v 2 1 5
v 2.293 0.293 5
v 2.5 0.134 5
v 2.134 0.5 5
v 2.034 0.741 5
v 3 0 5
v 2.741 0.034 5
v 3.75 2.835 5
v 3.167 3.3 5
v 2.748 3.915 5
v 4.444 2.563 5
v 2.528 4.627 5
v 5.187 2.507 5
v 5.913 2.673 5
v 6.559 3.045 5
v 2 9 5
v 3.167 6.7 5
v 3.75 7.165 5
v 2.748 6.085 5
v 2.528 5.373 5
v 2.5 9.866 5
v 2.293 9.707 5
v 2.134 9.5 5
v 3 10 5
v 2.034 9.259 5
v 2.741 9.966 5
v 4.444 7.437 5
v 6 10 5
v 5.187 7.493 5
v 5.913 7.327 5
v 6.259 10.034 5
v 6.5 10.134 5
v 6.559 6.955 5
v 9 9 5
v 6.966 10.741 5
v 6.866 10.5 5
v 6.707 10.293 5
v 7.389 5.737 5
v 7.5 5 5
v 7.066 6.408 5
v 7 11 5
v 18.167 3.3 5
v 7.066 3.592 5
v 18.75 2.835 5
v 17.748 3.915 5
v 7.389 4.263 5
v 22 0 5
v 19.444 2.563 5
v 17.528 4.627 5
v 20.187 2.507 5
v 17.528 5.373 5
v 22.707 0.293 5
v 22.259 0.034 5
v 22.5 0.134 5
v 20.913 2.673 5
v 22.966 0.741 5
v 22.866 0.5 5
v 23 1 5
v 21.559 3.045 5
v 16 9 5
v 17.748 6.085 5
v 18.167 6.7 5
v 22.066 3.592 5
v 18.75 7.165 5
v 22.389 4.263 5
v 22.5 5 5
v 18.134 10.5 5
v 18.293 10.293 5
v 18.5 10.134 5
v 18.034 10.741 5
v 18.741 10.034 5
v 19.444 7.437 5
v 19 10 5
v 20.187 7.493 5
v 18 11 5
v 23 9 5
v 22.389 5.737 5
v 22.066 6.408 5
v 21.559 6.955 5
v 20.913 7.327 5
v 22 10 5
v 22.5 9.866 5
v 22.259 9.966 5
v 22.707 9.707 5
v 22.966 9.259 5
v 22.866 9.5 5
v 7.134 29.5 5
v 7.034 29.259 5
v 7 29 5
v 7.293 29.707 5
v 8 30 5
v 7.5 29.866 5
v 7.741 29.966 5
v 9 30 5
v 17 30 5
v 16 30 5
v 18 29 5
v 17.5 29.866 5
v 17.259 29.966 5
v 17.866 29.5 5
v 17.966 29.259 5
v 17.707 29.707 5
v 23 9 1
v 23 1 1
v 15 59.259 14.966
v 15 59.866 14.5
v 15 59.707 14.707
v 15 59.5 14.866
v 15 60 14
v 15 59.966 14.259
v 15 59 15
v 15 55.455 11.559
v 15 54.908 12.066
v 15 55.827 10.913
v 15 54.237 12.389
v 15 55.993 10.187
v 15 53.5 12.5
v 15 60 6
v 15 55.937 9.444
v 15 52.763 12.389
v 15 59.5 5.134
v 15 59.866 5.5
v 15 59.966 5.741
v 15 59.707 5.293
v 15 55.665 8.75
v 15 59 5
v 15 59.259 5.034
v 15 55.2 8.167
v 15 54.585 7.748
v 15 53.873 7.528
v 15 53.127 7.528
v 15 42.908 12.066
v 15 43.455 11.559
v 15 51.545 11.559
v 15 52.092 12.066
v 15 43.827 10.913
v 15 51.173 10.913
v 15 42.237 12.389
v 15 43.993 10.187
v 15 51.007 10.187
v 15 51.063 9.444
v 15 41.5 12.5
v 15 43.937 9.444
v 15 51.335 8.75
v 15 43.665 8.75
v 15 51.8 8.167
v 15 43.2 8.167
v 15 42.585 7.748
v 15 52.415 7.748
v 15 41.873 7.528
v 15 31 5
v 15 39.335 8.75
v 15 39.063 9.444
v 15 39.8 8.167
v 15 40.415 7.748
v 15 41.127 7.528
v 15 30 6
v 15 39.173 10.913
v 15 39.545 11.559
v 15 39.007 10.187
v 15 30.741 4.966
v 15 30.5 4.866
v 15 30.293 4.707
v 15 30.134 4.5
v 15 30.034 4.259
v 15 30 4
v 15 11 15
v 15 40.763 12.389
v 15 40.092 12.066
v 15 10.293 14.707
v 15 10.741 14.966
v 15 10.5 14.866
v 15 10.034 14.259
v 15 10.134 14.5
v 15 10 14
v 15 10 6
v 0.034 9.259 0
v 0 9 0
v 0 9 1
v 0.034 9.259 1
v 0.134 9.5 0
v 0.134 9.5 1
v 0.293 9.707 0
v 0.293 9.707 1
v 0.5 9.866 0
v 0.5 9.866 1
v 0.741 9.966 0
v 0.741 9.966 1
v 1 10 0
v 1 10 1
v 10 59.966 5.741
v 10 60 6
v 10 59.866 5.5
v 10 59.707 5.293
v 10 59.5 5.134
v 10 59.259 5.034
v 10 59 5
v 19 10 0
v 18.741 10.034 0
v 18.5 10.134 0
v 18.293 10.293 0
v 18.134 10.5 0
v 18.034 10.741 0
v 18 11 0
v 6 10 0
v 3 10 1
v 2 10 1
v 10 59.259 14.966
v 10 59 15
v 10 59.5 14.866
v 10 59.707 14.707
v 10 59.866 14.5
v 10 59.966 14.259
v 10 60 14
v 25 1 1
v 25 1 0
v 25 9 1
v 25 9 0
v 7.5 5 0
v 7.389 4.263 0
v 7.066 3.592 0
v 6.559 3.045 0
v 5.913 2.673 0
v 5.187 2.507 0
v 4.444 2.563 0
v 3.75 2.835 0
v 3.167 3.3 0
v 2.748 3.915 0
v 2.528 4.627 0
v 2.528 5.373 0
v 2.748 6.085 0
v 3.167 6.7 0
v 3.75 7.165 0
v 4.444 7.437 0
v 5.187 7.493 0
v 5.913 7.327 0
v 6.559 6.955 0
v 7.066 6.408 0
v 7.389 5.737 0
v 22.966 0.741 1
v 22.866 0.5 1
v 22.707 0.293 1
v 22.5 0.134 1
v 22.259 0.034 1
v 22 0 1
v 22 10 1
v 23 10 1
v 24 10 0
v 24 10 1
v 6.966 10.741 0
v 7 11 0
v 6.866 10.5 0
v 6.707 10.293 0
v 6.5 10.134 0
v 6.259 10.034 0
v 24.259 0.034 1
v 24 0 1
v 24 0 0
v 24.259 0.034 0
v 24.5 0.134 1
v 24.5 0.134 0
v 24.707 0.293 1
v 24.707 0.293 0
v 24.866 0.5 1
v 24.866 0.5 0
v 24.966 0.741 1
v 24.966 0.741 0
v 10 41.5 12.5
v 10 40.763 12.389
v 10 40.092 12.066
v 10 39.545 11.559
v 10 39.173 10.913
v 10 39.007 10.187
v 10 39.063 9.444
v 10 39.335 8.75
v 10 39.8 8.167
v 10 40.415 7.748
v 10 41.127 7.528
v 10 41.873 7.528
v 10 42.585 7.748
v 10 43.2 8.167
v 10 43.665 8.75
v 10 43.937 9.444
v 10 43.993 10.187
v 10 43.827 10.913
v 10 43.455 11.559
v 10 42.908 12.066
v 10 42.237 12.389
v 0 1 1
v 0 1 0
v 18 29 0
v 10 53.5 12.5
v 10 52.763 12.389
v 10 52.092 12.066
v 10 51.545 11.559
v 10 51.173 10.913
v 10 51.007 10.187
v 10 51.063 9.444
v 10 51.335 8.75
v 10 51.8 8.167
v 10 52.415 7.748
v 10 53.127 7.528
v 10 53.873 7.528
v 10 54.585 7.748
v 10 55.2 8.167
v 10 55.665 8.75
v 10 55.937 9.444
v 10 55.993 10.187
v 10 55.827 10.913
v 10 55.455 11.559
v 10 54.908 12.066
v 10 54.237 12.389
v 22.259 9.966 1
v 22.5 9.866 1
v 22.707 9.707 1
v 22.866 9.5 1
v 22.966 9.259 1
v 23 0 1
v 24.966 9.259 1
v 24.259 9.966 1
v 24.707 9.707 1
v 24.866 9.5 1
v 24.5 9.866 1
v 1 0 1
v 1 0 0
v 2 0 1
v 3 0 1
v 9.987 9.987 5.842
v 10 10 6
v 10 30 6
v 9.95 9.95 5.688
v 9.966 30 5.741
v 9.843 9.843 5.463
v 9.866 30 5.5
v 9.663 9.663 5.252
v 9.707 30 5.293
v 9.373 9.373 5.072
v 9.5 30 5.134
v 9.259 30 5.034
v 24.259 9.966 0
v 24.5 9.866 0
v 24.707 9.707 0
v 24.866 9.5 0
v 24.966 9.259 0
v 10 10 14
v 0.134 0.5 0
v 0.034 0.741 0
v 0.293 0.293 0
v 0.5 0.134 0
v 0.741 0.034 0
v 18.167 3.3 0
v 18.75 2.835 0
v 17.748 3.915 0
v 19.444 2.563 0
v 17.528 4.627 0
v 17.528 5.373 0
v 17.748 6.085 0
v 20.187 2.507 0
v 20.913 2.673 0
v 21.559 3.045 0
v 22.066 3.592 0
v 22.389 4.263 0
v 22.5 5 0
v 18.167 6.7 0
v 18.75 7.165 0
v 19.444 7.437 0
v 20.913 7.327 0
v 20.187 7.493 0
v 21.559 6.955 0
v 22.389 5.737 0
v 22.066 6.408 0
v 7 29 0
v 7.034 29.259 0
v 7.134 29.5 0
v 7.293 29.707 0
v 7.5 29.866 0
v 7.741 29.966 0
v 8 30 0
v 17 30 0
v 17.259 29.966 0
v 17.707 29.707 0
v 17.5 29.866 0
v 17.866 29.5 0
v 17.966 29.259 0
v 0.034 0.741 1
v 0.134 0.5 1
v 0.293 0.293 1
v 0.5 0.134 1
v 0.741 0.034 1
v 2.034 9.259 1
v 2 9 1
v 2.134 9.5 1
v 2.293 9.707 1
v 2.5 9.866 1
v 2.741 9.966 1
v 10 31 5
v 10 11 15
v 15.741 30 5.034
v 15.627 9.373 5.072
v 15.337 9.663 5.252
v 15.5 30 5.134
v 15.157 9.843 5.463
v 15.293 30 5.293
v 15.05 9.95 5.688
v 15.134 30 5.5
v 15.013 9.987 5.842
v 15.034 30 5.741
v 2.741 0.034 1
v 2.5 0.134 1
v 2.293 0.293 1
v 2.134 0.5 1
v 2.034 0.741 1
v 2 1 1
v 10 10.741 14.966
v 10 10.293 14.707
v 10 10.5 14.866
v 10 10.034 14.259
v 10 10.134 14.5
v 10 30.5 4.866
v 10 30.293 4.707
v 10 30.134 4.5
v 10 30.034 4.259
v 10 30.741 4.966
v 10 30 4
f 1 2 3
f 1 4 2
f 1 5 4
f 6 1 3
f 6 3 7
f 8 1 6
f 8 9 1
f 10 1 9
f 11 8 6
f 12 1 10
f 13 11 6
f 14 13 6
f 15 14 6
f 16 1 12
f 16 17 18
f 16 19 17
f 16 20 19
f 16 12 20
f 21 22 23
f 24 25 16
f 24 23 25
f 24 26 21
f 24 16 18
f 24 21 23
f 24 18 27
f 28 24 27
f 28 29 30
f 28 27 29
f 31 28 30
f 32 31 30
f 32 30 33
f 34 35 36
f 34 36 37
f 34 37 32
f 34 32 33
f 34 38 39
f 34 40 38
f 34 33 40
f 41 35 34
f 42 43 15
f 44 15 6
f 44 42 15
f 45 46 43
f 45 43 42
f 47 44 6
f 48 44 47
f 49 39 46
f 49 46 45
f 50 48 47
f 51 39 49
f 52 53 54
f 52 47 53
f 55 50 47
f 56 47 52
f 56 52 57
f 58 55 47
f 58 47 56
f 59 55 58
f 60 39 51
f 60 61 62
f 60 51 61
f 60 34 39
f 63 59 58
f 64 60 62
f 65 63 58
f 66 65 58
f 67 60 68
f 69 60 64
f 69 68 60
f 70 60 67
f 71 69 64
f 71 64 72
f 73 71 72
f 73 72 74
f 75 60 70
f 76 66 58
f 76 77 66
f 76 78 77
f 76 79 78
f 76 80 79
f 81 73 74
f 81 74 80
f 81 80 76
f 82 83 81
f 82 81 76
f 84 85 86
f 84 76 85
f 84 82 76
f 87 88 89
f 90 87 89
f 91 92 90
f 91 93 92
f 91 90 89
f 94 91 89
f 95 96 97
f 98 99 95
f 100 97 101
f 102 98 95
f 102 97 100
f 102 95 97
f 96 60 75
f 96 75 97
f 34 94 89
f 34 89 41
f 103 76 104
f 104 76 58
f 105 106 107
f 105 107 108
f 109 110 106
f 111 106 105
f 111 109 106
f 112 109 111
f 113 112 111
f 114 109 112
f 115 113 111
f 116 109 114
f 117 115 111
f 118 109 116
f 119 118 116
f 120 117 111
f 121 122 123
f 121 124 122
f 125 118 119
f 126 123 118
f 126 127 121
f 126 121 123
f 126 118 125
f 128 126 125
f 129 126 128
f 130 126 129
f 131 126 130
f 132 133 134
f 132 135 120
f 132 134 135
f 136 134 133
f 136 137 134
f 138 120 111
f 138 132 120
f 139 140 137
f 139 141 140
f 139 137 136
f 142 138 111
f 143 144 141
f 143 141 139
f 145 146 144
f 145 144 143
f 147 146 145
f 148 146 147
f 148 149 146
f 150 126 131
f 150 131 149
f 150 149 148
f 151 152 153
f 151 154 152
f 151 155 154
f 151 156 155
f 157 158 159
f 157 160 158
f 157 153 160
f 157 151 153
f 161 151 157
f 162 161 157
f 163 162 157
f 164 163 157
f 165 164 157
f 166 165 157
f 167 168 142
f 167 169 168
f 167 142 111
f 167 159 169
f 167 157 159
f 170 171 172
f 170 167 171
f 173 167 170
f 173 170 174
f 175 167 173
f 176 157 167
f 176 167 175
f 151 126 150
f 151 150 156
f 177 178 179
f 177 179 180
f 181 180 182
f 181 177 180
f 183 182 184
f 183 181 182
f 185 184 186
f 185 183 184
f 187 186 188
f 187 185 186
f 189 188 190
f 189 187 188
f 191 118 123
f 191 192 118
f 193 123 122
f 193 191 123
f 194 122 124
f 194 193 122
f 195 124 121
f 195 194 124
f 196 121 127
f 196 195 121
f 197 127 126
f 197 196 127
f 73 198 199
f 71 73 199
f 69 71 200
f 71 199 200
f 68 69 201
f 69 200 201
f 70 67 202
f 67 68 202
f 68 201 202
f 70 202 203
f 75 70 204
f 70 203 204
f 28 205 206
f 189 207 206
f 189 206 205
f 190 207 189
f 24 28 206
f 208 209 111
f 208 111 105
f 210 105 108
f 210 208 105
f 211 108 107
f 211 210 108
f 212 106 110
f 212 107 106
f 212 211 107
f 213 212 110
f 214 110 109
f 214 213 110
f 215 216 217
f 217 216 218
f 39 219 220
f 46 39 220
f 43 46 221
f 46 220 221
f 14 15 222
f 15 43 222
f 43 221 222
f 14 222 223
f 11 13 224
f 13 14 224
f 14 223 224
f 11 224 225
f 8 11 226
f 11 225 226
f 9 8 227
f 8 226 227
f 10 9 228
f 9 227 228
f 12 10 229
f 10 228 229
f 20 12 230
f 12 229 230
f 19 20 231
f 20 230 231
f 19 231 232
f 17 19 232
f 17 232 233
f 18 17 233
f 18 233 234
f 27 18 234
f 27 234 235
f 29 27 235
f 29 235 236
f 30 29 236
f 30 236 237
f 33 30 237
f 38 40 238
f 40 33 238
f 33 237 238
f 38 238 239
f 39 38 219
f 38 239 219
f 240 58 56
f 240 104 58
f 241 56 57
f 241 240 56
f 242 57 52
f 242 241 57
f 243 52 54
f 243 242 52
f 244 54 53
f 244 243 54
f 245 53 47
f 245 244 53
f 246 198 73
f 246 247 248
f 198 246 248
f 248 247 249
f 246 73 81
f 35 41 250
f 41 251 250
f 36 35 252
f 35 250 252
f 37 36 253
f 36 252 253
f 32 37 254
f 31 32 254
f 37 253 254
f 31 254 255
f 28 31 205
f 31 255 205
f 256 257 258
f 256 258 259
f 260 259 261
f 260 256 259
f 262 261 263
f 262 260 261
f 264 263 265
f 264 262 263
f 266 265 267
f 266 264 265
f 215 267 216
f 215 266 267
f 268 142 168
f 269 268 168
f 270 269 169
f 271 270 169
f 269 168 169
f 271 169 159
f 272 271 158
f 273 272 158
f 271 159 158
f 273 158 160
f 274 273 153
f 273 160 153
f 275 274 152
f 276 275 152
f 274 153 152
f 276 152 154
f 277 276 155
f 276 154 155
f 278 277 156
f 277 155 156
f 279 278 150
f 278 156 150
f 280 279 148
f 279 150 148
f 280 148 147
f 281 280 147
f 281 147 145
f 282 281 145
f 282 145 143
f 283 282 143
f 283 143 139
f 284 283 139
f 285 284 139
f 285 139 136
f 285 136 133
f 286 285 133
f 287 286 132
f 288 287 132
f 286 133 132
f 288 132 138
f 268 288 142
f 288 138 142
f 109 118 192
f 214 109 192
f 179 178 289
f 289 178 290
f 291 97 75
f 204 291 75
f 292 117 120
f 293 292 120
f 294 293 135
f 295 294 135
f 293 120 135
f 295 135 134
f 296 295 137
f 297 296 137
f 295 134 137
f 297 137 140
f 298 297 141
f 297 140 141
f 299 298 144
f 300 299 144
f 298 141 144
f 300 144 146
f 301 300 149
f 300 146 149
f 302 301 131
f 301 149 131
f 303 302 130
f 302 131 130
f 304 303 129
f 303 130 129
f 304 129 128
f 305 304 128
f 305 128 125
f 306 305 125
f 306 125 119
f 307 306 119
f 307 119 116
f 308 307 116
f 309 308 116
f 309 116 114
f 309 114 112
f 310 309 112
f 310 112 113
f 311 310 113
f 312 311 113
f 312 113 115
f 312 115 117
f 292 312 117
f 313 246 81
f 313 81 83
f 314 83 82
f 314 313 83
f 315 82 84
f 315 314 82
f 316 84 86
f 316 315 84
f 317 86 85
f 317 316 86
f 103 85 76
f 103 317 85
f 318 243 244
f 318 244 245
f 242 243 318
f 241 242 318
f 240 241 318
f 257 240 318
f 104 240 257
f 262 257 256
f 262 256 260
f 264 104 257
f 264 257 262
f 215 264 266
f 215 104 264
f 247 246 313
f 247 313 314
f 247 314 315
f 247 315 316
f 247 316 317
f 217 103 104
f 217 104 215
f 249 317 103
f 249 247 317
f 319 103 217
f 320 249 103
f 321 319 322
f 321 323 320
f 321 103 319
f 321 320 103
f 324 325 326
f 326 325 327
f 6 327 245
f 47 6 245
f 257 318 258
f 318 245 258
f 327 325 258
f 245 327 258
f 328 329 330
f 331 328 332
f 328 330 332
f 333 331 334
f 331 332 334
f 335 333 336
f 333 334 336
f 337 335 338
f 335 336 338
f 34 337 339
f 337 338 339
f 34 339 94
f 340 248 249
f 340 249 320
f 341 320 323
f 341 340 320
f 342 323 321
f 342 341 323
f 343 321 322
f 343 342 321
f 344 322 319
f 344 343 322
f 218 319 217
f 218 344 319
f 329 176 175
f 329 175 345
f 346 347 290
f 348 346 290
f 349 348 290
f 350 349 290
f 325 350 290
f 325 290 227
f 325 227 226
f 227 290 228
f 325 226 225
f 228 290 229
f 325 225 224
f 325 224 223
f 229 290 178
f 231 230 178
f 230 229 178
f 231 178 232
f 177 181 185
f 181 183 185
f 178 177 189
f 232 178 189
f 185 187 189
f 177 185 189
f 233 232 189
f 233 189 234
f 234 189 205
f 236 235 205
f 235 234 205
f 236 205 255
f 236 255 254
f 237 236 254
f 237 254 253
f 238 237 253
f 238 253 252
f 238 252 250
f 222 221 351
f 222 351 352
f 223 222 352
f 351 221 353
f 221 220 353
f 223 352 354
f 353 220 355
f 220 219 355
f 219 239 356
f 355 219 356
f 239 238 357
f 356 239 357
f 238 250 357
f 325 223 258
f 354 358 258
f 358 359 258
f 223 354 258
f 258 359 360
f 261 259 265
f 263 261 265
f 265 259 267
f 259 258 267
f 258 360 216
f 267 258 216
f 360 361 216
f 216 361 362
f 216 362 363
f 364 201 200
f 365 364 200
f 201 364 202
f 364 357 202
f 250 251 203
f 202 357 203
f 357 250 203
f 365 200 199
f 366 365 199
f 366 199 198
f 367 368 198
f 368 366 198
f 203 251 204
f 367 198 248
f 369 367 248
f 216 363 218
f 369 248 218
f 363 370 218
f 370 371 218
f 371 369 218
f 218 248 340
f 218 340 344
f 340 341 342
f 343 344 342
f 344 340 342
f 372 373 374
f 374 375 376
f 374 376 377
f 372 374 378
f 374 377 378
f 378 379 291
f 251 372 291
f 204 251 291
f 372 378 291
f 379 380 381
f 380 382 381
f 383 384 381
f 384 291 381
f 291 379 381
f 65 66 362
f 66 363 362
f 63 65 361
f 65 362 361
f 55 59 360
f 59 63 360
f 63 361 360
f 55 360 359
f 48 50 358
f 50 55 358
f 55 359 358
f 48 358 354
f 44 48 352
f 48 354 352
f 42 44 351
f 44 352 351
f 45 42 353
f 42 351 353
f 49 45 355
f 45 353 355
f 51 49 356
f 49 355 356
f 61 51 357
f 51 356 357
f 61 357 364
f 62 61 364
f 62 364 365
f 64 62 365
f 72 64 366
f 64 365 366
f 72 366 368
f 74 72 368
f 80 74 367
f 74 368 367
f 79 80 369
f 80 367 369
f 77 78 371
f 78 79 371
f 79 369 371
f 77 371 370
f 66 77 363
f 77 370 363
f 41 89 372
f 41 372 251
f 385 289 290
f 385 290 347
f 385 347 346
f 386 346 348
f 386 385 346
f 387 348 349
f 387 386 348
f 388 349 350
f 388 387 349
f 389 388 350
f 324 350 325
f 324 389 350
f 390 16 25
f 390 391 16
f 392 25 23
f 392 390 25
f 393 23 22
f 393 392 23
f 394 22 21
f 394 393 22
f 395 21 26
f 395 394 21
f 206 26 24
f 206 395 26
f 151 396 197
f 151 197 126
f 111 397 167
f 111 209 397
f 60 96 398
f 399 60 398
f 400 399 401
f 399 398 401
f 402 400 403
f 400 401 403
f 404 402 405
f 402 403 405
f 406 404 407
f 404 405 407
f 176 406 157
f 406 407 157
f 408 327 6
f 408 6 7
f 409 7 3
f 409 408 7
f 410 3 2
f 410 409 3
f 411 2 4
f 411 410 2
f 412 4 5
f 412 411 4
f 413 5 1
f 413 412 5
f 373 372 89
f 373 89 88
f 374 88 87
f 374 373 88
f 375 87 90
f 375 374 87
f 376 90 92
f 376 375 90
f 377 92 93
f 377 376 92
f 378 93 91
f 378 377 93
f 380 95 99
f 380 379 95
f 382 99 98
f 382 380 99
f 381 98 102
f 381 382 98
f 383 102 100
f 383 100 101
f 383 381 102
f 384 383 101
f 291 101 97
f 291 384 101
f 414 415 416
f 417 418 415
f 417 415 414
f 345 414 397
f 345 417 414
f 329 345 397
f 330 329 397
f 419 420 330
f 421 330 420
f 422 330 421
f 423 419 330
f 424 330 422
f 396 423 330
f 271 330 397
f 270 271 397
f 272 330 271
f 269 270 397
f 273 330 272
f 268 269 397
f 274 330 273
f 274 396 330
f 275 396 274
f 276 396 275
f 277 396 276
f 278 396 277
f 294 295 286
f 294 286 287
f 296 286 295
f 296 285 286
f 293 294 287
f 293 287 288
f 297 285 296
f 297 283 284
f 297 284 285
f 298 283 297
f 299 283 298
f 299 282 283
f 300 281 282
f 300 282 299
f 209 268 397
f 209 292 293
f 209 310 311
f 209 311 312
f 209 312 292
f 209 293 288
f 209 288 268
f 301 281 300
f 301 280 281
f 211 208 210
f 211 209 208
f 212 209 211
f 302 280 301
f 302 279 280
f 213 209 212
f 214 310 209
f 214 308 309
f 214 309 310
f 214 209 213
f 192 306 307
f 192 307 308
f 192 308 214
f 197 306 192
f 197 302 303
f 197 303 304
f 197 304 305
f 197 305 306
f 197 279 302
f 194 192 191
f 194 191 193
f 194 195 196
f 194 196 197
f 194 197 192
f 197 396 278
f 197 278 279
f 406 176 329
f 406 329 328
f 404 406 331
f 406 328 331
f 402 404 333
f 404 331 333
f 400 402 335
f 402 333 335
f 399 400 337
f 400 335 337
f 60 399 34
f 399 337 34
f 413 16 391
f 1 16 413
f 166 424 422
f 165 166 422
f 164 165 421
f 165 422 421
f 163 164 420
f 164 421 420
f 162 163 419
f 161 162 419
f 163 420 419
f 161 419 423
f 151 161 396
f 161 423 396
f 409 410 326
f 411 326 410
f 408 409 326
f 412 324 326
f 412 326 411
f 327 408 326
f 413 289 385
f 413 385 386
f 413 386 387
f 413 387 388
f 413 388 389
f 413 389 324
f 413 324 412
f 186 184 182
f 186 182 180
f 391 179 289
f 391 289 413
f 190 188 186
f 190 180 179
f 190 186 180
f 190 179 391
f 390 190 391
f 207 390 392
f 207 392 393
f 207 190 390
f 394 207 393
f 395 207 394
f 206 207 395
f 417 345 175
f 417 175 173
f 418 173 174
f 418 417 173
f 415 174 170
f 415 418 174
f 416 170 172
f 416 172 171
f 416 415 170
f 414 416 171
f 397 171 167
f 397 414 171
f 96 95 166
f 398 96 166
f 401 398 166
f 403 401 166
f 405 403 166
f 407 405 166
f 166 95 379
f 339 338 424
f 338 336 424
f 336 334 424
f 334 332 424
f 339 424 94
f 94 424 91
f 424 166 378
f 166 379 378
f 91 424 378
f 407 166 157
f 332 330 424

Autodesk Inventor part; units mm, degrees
ref_plane "YZ Plane" through (0, 0, 0) normal (1, 0, 0) x (0, 1, 0)
ref_plane "XZ Plane" through (0, 0, 0) normal (0, 1, 0) x (-1, 0, 0)
ref_plane "XY Plane" through (0, 0, 0) normal (0, 0, 1) x (1, 0, 0)
sketch "スケッチ6" plane through (0, 0, 0) normal (0, 0, 1) x (1, 0, 0)
  line L0 (0, 0) -> (25, 0)
  line L1 (25, 0) -> (25, 30)
  line L2 (25, 30) -> (0, 30)
  line L3 (0, 30) -> (0, 0)
  circle A0 centre (5, 5) radius 2.5
  circle A1 centre (20, 5) radius 2.5
  dimension "d39" = 5
  dimension "d40" = 5
  dimension "d41" = 5
  dimension "d42" = 5
  dimension "d43" = 15
  dimension "d44" = 5
  dimension "d45" = 5
  dimension "d46" = 30
extrude "押し出し4" add sketch "スケッチ6" along normal blind 5
sketch "スケッチ7" plane through (0, 0, 5) normal (0, 0, 1) x (1, 0, 0)
  line L0 (25, 30) -> (0, 30) projected
  line L1 (10, 30) -> (15, 30)
  line L2 (15, 30) -> (15, 10)
  line L3 (15, 10) -> (10, 10)
  line L4 (10, 10) -> (10, 30)
  line L5 (25, 0) -> (25, 30) projected
  line L6 (0, 30) -> (0, 0) projected
  line L7 (0, 0) -> (25, 0) projected
  line L8 (10, 30) -> (15, 30)
  line L9 (15, 30) -> (15, 60)
  line L10 (15, 60) -> (10, 60)
  line L11 (10, 60) -> (10, 30)
  dimension "d49" = 5
  dimension "d50" = 10
  dimension "d51" = 10
  dimension "d52" = 10
  dimension "d55" = 30
  dimension "d56" = 5
extrude "押し出し5" add sketch "スケッチ7" along normal blind 10 contours L2 L3 L4 L0 | L0 L11 L10 L9
sketch "スケッチ8" plane through (10, 30, 5) normal (-1, 0, 0) x (0, 0, 1)
  line L0 (10, 30) -> (10, -20) projected
  line L1 (0, 30) -> (10, 30) projected
  line L2 (0, -20) -> (10, -20) projected
  point P0 (-5, -30)
  point P1 (5, 11.5)
  point P2 (5, 23.5)
  dimension "d57" = 5
  dimension "d58" = 5
  dimension "d59" = 12
  dimension "d60" = 6.5
  dimension "d61" = 31.5
hole "穴3" at (10, 41.5, 10) at (10, 53.5, 10) direction (1, 0, 0) diameter 5 depth 8
sketch "スケッチ9" plane through (0, 0, 5) normal (0, 0, 1) x (1, 0, 0)
  line L0 (10, 30) -> (0, 30) projected
  line L1 (0, 30) -> (7, 30)
  line L2 (7, 30) -> (7, 10)
  line L3 (7, 10) -> (0, 10)
  line L4 (0, 10) -> (0, 30)
  line L5 (25, 0) -> (25, 30) projected
  line L6 (25, 30) -> (18, 30)
  line L7 (18, 30) -> (18, 10)
  line L8 (18, 10) -> (25, 10)
  line L9 (25, 10) -> (25, 30)
  point P0 (0, 0)
  point P1 (5, 30)
  point P2 (18, 20)
  point P3 (7, 20)
  dimension "d70" = 20
  dimension "d72" = 7
  dimension "d73" = 7
extrude "押し出し6" cut sketch "スケッチ9" against normal blind 10
fillet "フィレット4" radius 1 15 edges at (7, 30, 2.5) (12.5, 60, 5) (12.5, 60, 15) (12.5, 10, 15) (7, 10, 2.5) (0, 10, 2.5) (0, 0, 2.5) (18, 30, 2.5) (18, 10, 2.5) (25, 10, 2.5) (25, 0, 2.5) (10, 20, 5) (12.5, 30, 5) (15, 20, 5) (12.5, 10, 5)
sketch "スケッチ10" plane through (0, 0, 5) normal (0, 0, 1) x (1, 0, 0)
  line L0 (9, 30) -> (9, 9) projected
  line L1 (9, 30) -> (8, 30) projected
  arc A0 (8, 30) -> (7, 29) centre (8, 29) ccw projected
  line L2 (7, 29) -> (7, 11) projected
  arc A1 (6, 10) -> (7, 11) centre (6, 11) ccw projected
  line L3 (6, 10) -> (1, 10) projected
  arc A2 (1, 10) -> (0, 9) centre (1, 9) ccw projected
  line L4 (0, 9) -> (0, 1) projected
  arc A3 (0, 1) -> (1, 0) centre (1, 1) ccw projected
  line L5 (1, 0) -> (24, 0) projected
  arc A4 (24, 0) -> (25, 1) centre (24, 1) ccw projected
  line L6 (25, 1) -> (25, 9) projected
  arc A5 (25, 9) -> (24, 10) centre (24, 9) ccw projected
  line L7 (24, 10) -> (19, 10) projected
  arc A6 (18, 11) -> (19, 10) centre (19, 11) ccw projected
  line L8 (18, 11) -> (18, 29) projected
  arc A7 (18, 29) -> (17, 30) centre (17, 29) ccw projected
  line L9 (17, 30) -> (16, 30) projected
  line L10 (16, 9) -> (16, 30) projected
  line L11 (9, 9) -> (16, 9) projected
  circle A8 centre (5, 5) radius 2.5 projected
  circle A9 centre (20, 5) radius 2.5 projected
  line L12 (2, 8) -> (23, 8)
  line L13 (23, 8) -> (23, 2)
  line L14 (23, 2) -> (2, 2)
  line L15 (2, 2) -> (2, 8)
  line L16 (2, 10) -> (2, 0)
  line L17 (24, 10) -> (19, 10) projected
  line L18 (23, 10) -> (23, 0)
  point P0 (0, 0)
  point P1 (2, 2)
  point P2 (23, 2)
  dimension "d77" = 2
  dimension "d78" = 2
  dimension "d79" = 2
  dimension "d80" = 2
extrude "押し出し7" cut sketch "スケッチ10" against normal blind 4 contours L16 L15 L5 A3 L4 A2 L3 | L18 L7 A5 L6 A4 L5 L13
fillet "フィレット5" radius 1 4 edges at (23, 10, 3) (23, 0, 3) (2, 10, 3) (2, 0, 3)
equation "\"d42\" = d41"
equation "\"d45\" = d44"
equation "\"d58\" = d57"
equation "\"d73\" = d72"
properties part number "BP_BOX-Support-Bar-Connect1-Right" material "ABS プラスチック"
